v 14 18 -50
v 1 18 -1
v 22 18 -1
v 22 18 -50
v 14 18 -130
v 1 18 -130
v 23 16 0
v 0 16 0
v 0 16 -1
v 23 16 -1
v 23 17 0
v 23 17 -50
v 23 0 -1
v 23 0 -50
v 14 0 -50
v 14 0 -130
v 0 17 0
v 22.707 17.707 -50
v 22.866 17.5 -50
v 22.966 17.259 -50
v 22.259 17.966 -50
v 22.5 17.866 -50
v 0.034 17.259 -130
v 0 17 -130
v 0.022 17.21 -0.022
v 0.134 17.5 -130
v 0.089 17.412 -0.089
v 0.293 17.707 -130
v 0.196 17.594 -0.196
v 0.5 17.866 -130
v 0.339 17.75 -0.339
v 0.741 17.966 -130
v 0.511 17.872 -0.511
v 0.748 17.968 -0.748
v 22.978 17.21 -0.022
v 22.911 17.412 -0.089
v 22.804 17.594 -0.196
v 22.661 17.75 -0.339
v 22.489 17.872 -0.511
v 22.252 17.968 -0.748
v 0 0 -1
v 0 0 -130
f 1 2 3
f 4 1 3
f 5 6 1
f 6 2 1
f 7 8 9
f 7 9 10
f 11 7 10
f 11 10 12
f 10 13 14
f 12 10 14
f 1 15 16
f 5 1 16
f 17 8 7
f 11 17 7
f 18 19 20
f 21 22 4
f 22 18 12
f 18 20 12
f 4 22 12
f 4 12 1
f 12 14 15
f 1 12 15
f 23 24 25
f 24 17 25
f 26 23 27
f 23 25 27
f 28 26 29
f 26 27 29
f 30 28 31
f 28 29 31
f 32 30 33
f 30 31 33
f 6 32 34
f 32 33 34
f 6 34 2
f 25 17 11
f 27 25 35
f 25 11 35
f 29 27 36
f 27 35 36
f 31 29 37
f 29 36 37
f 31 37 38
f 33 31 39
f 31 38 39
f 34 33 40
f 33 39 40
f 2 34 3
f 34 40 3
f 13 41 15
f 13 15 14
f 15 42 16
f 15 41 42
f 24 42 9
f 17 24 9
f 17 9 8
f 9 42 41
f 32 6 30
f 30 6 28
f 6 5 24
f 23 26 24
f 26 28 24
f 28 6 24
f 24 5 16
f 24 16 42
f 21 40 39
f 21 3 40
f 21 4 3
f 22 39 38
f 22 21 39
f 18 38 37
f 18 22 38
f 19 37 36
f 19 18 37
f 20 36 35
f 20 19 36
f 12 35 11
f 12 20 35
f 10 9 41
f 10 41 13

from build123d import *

# Parameters (mm, degrees)
SALIENTE_EXTRUIR1_DEPTH = 18
CROQUIS3_W              = 23
CROQUIS3_H              = 16
CORTAR_EXTRUIR1_DEPTH   = 1
REDONDEO1_R             = 1


with BuildPart() as part:
    # Croquis2 → Saliente-Extruir1 (new body)
    with BuildSketch(Plane(origin=(0, 0, 0), x_dir=(1, 0, 0), z_dir=(0, 1, 0))):
        Polygon((0, 130), (0, 0), (23, 0), (23, 50), (14, 50), (14, 130), align=None)
    extrude(amount=SALIENTE_EXTRUIR1_DEPTH)

    # Croquis3 → Cortar-Extruir1 (cut)
    with BuildSketch(Plane.XY):
        with Locations((11.5, 8)):
            Rectangle(CROQUIS3_W, CROQUIS3_H)
    extrude(amount=-CORTAR_EXTRUIR1_DEPTH, mode=Mode.SUBTRACT)

    # Redondeo1
    redondeo1_edges = [part.edges().sort_by_distance(p)[0] for p in [
        (0, 18, -65),
        (11.5, 18, 0),
        (23, 18, -25),
    ]]
    fillet(redondeo1_edges, radius=REDONDEO1_R)


solid = part.part
